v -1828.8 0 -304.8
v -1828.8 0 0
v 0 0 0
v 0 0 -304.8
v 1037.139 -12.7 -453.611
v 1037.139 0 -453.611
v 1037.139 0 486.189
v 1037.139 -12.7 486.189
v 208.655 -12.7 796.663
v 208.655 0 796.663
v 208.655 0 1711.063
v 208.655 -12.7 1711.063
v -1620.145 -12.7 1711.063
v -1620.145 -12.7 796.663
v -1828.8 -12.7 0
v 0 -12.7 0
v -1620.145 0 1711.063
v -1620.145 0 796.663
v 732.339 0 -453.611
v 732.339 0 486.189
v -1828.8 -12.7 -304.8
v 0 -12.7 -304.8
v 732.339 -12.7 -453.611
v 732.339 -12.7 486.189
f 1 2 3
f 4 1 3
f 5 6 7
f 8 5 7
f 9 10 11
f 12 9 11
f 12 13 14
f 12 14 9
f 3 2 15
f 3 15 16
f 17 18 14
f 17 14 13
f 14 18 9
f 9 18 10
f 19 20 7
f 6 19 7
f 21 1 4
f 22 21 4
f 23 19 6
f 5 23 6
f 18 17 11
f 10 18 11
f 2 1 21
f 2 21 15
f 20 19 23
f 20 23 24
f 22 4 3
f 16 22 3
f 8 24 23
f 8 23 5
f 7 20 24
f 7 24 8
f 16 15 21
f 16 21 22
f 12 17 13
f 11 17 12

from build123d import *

# Parameters (mm, degrees)
F0_W     = 1828.8
F0_H     = 914.4
F0_W_2   = 304.8
F0_H_2   = 939.8
F0_H_3   = 304.8
F1_DEPTH = 12.7


with BuildPart() as f1:
    # F0 (on Front) → F1 (new body)
    with BuildSketch(Plane.XZ):
        with Locations((-705.744623, 1253.862967)):
            Rectangle(F0_W, F0_H)
        with Locations((884.738797, 16.289238)):
            Rectangle(F0_W_2, F0_H_2)
        with Locations((-914.4, -152.4)):
            Rectangle(F0_W, F0_H_3)
    extrude(amount=F1_DEPTH)


solid = f1.part
